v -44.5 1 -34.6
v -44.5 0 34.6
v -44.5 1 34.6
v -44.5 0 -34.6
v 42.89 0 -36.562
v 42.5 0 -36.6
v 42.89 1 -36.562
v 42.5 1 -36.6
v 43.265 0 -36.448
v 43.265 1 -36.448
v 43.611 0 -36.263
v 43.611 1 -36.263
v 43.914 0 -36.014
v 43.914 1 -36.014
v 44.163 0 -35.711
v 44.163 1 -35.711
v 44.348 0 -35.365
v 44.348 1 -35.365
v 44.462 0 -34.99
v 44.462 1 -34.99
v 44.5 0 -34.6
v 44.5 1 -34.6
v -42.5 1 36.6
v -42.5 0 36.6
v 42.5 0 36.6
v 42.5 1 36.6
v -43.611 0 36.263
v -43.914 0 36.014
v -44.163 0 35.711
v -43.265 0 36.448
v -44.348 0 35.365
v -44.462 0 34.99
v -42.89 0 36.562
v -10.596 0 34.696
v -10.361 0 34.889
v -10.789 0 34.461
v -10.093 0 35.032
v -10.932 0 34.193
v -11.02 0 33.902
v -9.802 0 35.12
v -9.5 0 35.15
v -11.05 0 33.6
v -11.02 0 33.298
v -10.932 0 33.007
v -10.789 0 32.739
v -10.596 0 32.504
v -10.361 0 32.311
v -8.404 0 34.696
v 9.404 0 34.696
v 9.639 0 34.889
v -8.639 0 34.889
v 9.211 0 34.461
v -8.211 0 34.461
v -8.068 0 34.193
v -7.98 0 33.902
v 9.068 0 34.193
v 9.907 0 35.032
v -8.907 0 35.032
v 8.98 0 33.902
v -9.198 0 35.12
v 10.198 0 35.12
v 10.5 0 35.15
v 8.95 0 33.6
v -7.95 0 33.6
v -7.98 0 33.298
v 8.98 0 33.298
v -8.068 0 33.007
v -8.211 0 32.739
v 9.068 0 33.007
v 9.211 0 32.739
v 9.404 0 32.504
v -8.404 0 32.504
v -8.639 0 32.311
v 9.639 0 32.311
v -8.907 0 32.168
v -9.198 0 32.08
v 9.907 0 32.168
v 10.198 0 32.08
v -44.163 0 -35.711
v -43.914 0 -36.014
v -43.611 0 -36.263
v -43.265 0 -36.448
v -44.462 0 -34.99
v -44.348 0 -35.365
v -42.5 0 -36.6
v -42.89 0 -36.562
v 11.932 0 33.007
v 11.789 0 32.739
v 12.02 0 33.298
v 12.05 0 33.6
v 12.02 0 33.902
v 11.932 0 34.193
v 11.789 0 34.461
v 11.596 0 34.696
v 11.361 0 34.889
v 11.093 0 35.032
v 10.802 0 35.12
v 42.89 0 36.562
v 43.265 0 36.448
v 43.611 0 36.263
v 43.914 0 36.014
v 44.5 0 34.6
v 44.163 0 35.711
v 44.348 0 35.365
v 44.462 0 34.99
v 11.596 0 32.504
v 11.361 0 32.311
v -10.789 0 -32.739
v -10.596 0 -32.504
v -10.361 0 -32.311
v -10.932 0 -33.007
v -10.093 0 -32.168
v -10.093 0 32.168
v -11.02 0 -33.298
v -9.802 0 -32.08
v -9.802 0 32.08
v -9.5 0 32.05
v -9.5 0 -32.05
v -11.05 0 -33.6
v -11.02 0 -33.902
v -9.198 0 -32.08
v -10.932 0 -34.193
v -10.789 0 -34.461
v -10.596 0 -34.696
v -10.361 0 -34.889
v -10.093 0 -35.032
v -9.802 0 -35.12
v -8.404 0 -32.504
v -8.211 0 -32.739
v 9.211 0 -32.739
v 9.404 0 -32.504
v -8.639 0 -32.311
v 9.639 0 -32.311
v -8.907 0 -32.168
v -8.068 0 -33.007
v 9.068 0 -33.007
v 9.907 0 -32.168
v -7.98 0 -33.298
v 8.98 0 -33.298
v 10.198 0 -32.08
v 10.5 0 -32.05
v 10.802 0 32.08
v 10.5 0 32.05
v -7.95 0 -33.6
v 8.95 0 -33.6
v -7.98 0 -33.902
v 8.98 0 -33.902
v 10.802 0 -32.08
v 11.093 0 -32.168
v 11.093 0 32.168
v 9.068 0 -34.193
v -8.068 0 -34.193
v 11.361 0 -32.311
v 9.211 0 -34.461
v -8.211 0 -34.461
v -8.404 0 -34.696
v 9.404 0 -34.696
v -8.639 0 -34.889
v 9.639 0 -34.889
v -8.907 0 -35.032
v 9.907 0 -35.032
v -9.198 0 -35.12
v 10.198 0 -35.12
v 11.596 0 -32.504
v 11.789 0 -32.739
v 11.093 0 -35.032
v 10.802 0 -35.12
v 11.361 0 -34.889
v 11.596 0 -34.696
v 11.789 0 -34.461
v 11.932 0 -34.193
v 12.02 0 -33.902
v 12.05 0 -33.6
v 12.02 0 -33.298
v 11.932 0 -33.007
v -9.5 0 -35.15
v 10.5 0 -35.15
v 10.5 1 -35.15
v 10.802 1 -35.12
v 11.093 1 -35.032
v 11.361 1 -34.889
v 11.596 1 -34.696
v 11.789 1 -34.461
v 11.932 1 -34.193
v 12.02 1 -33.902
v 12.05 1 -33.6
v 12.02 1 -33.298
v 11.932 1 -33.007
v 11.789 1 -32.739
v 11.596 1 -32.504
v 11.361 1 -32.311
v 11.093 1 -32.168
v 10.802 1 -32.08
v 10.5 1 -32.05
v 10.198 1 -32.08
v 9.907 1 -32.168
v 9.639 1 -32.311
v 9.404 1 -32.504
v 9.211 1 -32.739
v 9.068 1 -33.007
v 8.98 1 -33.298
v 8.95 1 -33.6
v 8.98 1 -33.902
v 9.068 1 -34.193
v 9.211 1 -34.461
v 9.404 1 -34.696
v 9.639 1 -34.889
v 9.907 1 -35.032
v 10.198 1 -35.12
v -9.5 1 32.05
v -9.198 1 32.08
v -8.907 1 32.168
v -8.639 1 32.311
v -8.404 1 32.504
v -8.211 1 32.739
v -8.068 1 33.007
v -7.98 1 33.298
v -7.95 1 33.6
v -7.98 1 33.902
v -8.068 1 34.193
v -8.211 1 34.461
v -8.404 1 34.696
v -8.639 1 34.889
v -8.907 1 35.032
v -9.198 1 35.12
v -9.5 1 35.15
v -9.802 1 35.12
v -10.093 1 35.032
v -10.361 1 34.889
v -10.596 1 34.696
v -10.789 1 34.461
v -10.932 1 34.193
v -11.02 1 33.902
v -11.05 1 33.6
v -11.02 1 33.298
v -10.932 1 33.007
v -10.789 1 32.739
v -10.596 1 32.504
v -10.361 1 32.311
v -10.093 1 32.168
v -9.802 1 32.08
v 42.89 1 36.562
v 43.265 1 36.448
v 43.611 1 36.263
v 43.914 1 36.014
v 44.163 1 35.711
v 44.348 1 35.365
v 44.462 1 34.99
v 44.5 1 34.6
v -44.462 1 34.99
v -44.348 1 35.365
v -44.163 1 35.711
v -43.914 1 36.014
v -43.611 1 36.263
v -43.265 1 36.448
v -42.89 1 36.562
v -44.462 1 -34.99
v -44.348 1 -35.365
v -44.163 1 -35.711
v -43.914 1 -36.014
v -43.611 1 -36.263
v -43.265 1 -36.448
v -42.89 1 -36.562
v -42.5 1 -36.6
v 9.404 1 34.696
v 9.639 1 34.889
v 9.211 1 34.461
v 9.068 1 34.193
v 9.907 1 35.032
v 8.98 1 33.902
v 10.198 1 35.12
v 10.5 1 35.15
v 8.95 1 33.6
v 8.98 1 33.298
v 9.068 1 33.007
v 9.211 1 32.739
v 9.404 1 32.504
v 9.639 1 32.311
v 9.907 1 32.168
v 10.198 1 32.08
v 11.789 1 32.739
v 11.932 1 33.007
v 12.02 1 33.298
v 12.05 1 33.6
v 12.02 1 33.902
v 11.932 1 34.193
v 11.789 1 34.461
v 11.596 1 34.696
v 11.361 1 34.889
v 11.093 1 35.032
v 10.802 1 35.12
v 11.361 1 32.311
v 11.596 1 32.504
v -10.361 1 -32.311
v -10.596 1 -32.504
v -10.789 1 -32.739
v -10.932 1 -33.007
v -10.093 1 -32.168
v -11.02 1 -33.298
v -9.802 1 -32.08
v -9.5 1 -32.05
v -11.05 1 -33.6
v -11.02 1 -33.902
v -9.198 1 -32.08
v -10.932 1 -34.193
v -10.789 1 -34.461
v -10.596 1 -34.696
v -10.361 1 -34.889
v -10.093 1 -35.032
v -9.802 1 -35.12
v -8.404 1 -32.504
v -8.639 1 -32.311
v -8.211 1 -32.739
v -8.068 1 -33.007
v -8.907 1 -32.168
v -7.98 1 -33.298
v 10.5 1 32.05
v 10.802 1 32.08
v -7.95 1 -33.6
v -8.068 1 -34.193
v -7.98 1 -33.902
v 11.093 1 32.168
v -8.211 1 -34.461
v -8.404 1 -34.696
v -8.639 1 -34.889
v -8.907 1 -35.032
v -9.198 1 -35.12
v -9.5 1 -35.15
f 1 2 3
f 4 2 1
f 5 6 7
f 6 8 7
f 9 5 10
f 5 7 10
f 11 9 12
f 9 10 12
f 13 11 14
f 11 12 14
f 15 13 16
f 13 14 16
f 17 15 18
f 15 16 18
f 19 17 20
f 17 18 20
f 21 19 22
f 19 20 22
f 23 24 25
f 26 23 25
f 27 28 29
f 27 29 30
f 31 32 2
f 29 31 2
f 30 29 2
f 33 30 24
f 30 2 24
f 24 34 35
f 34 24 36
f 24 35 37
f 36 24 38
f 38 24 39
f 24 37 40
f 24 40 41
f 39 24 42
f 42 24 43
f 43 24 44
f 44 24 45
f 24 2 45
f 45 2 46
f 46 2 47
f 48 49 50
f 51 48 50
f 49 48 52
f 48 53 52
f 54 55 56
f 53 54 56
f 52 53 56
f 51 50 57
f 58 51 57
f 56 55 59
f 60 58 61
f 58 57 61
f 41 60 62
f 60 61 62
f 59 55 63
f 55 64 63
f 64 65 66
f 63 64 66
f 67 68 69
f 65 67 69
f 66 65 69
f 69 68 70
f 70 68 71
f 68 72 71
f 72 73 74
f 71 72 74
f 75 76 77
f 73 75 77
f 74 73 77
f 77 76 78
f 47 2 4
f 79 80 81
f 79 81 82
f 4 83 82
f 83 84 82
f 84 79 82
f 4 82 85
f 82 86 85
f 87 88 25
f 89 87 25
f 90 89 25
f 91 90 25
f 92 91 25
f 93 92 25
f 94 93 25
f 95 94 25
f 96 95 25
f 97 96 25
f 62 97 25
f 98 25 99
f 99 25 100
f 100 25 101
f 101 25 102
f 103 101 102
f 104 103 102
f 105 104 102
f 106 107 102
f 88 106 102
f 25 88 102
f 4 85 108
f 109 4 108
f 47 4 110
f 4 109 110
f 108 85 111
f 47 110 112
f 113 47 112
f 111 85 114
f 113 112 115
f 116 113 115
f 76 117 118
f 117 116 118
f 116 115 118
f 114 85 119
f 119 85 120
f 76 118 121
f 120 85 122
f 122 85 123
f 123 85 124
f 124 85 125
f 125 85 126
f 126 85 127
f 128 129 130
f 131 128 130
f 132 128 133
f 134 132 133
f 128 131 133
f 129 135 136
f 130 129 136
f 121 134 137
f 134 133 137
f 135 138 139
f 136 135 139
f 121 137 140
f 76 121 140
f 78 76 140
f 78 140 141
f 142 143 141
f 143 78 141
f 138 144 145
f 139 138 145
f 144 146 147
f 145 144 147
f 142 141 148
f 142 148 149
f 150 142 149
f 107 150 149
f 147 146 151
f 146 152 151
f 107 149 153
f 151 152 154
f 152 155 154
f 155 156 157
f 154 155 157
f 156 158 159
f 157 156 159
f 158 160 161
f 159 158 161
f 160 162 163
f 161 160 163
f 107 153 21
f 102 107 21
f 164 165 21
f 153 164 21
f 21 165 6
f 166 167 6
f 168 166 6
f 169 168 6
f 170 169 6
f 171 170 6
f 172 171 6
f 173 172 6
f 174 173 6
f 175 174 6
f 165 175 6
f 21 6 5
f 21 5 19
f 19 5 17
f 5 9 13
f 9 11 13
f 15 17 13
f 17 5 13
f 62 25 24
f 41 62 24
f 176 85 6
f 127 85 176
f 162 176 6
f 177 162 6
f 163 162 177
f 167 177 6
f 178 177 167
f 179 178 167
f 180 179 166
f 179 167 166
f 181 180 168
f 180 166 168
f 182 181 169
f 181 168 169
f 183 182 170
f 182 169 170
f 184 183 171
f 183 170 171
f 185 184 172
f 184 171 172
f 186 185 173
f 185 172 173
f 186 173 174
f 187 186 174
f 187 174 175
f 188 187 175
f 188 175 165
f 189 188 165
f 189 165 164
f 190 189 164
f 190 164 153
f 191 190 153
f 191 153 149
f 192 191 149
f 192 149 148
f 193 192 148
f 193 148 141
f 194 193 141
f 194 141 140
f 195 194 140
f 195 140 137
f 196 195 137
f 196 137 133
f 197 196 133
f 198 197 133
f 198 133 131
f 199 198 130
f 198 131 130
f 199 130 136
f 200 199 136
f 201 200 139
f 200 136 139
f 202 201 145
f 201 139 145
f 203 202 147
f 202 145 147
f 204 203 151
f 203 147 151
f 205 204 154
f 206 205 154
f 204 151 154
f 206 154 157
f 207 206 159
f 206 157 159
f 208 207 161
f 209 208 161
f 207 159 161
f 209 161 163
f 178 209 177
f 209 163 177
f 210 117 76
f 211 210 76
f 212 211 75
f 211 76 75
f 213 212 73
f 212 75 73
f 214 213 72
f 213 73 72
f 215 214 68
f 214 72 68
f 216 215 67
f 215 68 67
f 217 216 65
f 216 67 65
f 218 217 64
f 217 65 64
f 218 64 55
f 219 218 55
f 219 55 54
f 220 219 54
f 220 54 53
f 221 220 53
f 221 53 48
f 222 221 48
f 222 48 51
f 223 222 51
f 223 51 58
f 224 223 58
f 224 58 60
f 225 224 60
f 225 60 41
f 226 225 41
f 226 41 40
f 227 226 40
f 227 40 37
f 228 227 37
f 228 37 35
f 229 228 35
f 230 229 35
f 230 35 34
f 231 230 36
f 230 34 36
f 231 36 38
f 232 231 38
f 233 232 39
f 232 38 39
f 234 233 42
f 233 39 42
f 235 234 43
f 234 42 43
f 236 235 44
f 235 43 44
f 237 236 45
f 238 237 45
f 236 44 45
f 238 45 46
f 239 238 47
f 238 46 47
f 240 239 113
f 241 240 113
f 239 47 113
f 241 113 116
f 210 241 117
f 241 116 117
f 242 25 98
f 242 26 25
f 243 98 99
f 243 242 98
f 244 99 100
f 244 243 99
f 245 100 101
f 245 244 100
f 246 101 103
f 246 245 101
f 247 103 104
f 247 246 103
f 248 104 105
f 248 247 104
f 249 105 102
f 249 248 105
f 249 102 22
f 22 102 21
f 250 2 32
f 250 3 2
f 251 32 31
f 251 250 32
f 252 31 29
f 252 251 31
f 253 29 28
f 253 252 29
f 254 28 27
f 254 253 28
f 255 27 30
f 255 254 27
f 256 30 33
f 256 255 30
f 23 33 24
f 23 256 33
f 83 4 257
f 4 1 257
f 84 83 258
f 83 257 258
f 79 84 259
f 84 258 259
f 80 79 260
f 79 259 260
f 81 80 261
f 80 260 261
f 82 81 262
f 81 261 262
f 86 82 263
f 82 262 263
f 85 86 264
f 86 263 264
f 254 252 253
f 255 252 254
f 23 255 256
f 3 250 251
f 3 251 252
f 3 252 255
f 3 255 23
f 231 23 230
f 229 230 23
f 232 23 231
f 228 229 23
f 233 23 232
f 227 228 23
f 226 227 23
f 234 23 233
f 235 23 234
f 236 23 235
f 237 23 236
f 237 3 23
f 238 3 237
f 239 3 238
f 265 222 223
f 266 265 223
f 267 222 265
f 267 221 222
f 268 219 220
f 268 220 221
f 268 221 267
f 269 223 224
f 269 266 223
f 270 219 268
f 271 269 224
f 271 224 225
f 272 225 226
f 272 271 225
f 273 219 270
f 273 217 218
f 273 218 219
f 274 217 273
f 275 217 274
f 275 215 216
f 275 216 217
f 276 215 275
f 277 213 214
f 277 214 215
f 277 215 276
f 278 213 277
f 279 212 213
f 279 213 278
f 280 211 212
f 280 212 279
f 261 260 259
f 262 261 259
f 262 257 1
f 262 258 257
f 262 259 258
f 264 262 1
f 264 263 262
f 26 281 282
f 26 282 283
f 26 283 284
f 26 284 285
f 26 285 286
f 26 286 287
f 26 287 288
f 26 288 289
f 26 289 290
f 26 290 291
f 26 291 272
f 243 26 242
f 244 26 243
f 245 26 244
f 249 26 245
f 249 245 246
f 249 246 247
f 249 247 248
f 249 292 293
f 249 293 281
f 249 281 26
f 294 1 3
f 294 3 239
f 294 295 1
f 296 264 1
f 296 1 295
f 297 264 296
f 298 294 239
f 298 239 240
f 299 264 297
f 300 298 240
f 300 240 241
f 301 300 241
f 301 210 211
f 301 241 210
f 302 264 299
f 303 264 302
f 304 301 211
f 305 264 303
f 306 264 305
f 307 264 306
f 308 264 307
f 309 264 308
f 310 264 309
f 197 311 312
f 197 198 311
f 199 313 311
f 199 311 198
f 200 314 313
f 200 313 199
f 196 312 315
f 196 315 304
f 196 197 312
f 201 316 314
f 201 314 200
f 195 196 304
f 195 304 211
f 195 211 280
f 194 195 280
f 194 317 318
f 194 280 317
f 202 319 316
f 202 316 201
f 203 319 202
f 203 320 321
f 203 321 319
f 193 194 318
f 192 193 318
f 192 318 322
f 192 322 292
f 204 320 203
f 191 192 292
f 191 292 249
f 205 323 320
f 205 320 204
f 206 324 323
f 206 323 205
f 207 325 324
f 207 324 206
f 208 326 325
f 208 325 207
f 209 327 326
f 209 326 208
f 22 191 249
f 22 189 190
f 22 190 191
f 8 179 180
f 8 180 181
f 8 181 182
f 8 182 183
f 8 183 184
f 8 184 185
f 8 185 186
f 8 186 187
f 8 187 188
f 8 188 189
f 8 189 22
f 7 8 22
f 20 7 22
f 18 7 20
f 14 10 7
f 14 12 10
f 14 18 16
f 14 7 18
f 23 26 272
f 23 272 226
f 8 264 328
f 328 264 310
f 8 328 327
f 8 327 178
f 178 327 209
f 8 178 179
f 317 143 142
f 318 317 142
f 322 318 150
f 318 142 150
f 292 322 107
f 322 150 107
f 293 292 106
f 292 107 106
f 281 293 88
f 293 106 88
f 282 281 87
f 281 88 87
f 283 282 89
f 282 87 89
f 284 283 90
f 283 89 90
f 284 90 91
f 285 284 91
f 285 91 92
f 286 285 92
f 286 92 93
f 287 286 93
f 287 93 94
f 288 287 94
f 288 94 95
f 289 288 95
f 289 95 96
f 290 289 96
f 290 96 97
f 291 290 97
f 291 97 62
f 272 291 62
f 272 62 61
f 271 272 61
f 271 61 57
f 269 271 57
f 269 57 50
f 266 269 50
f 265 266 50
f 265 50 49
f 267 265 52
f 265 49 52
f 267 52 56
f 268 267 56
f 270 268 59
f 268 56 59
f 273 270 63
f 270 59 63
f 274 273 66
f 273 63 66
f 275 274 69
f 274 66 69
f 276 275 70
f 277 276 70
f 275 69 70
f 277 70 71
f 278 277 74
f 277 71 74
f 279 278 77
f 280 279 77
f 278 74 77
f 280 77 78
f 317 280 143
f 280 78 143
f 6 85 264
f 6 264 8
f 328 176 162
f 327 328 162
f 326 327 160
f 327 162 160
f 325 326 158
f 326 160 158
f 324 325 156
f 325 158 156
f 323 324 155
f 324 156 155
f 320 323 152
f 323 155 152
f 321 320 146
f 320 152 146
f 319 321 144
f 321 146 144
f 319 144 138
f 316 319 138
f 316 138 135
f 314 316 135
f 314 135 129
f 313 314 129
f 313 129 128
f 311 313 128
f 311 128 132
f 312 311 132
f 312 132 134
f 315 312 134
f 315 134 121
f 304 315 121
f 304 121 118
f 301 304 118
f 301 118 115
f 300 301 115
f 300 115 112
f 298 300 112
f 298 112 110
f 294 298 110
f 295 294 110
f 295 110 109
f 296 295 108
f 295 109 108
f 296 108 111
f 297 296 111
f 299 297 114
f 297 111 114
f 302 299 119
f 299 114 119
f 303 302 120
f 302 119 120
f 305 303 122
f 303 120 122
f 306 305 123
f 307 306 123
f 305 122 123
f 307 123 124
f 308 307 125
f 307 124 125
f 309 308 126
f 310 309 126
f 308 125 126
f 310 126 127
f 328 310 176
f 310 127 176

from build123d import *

# Parameters (mm, degrees)
SKETCH_1_W          = 89
SKETCH_1_H          = 73.2
EXTRUDE_1_DEPTH     = 1
SKETCH_2_R          = 1.55
CUT_EXTRUDE_1_DEPTH = 10
FILLET_1_R          = 2


with BuildPart() as part:
    # 草图1 → 凸台-拉伸1 (new body)
    with BuildSketch(Plane(origin=(0, 0, 0), x_dir=(1, 0, 0), z_dir=(0, 1, 0))):
        Rectangle(SKETCH_1_W, SKETCH_1_H)
    extrude(amount=EXTRUDE_1_DEPTH)

    # 草图2 → 切除-拉伸1 (cut)
    with BuildSketch(Plane.XZ):
        with Locations(Location((10.5, 33.6, 0), (0, 0, 270))):
            Circle(SKETCH_2_R)
        with Locations(Location((-9.5, 33.6, 0), (0, 0, 270))):
            Circle(SKETCH_2_R)
        with Locations(Location((-9.5, -33.6, 0), (0, 0, 270))):
            Circle(SKETCH_2_R)
        with Locations(Location((10.5, -33.6, 0), (0, 0, 270))):
            Circle(SKETCH_2_R)
    extrude(amount=-CUT_EXTRUDE_1_DEPTH, mode=Mode.SUBTRACT)

    # 圆角1
    fillet_1_edges = [part.edges().sort_by_distance(p)[0] for p in [
        (44.5, 0.5, 36.6),
        (-44.5, 0.5, 36.6),
        (-44.5, 0.5, -36.6),
        (44.5, 0.5, -36.6),
    ]]
    fillet(fillet_1_edges, radius=FILLET_1_R)


solid = part.part
